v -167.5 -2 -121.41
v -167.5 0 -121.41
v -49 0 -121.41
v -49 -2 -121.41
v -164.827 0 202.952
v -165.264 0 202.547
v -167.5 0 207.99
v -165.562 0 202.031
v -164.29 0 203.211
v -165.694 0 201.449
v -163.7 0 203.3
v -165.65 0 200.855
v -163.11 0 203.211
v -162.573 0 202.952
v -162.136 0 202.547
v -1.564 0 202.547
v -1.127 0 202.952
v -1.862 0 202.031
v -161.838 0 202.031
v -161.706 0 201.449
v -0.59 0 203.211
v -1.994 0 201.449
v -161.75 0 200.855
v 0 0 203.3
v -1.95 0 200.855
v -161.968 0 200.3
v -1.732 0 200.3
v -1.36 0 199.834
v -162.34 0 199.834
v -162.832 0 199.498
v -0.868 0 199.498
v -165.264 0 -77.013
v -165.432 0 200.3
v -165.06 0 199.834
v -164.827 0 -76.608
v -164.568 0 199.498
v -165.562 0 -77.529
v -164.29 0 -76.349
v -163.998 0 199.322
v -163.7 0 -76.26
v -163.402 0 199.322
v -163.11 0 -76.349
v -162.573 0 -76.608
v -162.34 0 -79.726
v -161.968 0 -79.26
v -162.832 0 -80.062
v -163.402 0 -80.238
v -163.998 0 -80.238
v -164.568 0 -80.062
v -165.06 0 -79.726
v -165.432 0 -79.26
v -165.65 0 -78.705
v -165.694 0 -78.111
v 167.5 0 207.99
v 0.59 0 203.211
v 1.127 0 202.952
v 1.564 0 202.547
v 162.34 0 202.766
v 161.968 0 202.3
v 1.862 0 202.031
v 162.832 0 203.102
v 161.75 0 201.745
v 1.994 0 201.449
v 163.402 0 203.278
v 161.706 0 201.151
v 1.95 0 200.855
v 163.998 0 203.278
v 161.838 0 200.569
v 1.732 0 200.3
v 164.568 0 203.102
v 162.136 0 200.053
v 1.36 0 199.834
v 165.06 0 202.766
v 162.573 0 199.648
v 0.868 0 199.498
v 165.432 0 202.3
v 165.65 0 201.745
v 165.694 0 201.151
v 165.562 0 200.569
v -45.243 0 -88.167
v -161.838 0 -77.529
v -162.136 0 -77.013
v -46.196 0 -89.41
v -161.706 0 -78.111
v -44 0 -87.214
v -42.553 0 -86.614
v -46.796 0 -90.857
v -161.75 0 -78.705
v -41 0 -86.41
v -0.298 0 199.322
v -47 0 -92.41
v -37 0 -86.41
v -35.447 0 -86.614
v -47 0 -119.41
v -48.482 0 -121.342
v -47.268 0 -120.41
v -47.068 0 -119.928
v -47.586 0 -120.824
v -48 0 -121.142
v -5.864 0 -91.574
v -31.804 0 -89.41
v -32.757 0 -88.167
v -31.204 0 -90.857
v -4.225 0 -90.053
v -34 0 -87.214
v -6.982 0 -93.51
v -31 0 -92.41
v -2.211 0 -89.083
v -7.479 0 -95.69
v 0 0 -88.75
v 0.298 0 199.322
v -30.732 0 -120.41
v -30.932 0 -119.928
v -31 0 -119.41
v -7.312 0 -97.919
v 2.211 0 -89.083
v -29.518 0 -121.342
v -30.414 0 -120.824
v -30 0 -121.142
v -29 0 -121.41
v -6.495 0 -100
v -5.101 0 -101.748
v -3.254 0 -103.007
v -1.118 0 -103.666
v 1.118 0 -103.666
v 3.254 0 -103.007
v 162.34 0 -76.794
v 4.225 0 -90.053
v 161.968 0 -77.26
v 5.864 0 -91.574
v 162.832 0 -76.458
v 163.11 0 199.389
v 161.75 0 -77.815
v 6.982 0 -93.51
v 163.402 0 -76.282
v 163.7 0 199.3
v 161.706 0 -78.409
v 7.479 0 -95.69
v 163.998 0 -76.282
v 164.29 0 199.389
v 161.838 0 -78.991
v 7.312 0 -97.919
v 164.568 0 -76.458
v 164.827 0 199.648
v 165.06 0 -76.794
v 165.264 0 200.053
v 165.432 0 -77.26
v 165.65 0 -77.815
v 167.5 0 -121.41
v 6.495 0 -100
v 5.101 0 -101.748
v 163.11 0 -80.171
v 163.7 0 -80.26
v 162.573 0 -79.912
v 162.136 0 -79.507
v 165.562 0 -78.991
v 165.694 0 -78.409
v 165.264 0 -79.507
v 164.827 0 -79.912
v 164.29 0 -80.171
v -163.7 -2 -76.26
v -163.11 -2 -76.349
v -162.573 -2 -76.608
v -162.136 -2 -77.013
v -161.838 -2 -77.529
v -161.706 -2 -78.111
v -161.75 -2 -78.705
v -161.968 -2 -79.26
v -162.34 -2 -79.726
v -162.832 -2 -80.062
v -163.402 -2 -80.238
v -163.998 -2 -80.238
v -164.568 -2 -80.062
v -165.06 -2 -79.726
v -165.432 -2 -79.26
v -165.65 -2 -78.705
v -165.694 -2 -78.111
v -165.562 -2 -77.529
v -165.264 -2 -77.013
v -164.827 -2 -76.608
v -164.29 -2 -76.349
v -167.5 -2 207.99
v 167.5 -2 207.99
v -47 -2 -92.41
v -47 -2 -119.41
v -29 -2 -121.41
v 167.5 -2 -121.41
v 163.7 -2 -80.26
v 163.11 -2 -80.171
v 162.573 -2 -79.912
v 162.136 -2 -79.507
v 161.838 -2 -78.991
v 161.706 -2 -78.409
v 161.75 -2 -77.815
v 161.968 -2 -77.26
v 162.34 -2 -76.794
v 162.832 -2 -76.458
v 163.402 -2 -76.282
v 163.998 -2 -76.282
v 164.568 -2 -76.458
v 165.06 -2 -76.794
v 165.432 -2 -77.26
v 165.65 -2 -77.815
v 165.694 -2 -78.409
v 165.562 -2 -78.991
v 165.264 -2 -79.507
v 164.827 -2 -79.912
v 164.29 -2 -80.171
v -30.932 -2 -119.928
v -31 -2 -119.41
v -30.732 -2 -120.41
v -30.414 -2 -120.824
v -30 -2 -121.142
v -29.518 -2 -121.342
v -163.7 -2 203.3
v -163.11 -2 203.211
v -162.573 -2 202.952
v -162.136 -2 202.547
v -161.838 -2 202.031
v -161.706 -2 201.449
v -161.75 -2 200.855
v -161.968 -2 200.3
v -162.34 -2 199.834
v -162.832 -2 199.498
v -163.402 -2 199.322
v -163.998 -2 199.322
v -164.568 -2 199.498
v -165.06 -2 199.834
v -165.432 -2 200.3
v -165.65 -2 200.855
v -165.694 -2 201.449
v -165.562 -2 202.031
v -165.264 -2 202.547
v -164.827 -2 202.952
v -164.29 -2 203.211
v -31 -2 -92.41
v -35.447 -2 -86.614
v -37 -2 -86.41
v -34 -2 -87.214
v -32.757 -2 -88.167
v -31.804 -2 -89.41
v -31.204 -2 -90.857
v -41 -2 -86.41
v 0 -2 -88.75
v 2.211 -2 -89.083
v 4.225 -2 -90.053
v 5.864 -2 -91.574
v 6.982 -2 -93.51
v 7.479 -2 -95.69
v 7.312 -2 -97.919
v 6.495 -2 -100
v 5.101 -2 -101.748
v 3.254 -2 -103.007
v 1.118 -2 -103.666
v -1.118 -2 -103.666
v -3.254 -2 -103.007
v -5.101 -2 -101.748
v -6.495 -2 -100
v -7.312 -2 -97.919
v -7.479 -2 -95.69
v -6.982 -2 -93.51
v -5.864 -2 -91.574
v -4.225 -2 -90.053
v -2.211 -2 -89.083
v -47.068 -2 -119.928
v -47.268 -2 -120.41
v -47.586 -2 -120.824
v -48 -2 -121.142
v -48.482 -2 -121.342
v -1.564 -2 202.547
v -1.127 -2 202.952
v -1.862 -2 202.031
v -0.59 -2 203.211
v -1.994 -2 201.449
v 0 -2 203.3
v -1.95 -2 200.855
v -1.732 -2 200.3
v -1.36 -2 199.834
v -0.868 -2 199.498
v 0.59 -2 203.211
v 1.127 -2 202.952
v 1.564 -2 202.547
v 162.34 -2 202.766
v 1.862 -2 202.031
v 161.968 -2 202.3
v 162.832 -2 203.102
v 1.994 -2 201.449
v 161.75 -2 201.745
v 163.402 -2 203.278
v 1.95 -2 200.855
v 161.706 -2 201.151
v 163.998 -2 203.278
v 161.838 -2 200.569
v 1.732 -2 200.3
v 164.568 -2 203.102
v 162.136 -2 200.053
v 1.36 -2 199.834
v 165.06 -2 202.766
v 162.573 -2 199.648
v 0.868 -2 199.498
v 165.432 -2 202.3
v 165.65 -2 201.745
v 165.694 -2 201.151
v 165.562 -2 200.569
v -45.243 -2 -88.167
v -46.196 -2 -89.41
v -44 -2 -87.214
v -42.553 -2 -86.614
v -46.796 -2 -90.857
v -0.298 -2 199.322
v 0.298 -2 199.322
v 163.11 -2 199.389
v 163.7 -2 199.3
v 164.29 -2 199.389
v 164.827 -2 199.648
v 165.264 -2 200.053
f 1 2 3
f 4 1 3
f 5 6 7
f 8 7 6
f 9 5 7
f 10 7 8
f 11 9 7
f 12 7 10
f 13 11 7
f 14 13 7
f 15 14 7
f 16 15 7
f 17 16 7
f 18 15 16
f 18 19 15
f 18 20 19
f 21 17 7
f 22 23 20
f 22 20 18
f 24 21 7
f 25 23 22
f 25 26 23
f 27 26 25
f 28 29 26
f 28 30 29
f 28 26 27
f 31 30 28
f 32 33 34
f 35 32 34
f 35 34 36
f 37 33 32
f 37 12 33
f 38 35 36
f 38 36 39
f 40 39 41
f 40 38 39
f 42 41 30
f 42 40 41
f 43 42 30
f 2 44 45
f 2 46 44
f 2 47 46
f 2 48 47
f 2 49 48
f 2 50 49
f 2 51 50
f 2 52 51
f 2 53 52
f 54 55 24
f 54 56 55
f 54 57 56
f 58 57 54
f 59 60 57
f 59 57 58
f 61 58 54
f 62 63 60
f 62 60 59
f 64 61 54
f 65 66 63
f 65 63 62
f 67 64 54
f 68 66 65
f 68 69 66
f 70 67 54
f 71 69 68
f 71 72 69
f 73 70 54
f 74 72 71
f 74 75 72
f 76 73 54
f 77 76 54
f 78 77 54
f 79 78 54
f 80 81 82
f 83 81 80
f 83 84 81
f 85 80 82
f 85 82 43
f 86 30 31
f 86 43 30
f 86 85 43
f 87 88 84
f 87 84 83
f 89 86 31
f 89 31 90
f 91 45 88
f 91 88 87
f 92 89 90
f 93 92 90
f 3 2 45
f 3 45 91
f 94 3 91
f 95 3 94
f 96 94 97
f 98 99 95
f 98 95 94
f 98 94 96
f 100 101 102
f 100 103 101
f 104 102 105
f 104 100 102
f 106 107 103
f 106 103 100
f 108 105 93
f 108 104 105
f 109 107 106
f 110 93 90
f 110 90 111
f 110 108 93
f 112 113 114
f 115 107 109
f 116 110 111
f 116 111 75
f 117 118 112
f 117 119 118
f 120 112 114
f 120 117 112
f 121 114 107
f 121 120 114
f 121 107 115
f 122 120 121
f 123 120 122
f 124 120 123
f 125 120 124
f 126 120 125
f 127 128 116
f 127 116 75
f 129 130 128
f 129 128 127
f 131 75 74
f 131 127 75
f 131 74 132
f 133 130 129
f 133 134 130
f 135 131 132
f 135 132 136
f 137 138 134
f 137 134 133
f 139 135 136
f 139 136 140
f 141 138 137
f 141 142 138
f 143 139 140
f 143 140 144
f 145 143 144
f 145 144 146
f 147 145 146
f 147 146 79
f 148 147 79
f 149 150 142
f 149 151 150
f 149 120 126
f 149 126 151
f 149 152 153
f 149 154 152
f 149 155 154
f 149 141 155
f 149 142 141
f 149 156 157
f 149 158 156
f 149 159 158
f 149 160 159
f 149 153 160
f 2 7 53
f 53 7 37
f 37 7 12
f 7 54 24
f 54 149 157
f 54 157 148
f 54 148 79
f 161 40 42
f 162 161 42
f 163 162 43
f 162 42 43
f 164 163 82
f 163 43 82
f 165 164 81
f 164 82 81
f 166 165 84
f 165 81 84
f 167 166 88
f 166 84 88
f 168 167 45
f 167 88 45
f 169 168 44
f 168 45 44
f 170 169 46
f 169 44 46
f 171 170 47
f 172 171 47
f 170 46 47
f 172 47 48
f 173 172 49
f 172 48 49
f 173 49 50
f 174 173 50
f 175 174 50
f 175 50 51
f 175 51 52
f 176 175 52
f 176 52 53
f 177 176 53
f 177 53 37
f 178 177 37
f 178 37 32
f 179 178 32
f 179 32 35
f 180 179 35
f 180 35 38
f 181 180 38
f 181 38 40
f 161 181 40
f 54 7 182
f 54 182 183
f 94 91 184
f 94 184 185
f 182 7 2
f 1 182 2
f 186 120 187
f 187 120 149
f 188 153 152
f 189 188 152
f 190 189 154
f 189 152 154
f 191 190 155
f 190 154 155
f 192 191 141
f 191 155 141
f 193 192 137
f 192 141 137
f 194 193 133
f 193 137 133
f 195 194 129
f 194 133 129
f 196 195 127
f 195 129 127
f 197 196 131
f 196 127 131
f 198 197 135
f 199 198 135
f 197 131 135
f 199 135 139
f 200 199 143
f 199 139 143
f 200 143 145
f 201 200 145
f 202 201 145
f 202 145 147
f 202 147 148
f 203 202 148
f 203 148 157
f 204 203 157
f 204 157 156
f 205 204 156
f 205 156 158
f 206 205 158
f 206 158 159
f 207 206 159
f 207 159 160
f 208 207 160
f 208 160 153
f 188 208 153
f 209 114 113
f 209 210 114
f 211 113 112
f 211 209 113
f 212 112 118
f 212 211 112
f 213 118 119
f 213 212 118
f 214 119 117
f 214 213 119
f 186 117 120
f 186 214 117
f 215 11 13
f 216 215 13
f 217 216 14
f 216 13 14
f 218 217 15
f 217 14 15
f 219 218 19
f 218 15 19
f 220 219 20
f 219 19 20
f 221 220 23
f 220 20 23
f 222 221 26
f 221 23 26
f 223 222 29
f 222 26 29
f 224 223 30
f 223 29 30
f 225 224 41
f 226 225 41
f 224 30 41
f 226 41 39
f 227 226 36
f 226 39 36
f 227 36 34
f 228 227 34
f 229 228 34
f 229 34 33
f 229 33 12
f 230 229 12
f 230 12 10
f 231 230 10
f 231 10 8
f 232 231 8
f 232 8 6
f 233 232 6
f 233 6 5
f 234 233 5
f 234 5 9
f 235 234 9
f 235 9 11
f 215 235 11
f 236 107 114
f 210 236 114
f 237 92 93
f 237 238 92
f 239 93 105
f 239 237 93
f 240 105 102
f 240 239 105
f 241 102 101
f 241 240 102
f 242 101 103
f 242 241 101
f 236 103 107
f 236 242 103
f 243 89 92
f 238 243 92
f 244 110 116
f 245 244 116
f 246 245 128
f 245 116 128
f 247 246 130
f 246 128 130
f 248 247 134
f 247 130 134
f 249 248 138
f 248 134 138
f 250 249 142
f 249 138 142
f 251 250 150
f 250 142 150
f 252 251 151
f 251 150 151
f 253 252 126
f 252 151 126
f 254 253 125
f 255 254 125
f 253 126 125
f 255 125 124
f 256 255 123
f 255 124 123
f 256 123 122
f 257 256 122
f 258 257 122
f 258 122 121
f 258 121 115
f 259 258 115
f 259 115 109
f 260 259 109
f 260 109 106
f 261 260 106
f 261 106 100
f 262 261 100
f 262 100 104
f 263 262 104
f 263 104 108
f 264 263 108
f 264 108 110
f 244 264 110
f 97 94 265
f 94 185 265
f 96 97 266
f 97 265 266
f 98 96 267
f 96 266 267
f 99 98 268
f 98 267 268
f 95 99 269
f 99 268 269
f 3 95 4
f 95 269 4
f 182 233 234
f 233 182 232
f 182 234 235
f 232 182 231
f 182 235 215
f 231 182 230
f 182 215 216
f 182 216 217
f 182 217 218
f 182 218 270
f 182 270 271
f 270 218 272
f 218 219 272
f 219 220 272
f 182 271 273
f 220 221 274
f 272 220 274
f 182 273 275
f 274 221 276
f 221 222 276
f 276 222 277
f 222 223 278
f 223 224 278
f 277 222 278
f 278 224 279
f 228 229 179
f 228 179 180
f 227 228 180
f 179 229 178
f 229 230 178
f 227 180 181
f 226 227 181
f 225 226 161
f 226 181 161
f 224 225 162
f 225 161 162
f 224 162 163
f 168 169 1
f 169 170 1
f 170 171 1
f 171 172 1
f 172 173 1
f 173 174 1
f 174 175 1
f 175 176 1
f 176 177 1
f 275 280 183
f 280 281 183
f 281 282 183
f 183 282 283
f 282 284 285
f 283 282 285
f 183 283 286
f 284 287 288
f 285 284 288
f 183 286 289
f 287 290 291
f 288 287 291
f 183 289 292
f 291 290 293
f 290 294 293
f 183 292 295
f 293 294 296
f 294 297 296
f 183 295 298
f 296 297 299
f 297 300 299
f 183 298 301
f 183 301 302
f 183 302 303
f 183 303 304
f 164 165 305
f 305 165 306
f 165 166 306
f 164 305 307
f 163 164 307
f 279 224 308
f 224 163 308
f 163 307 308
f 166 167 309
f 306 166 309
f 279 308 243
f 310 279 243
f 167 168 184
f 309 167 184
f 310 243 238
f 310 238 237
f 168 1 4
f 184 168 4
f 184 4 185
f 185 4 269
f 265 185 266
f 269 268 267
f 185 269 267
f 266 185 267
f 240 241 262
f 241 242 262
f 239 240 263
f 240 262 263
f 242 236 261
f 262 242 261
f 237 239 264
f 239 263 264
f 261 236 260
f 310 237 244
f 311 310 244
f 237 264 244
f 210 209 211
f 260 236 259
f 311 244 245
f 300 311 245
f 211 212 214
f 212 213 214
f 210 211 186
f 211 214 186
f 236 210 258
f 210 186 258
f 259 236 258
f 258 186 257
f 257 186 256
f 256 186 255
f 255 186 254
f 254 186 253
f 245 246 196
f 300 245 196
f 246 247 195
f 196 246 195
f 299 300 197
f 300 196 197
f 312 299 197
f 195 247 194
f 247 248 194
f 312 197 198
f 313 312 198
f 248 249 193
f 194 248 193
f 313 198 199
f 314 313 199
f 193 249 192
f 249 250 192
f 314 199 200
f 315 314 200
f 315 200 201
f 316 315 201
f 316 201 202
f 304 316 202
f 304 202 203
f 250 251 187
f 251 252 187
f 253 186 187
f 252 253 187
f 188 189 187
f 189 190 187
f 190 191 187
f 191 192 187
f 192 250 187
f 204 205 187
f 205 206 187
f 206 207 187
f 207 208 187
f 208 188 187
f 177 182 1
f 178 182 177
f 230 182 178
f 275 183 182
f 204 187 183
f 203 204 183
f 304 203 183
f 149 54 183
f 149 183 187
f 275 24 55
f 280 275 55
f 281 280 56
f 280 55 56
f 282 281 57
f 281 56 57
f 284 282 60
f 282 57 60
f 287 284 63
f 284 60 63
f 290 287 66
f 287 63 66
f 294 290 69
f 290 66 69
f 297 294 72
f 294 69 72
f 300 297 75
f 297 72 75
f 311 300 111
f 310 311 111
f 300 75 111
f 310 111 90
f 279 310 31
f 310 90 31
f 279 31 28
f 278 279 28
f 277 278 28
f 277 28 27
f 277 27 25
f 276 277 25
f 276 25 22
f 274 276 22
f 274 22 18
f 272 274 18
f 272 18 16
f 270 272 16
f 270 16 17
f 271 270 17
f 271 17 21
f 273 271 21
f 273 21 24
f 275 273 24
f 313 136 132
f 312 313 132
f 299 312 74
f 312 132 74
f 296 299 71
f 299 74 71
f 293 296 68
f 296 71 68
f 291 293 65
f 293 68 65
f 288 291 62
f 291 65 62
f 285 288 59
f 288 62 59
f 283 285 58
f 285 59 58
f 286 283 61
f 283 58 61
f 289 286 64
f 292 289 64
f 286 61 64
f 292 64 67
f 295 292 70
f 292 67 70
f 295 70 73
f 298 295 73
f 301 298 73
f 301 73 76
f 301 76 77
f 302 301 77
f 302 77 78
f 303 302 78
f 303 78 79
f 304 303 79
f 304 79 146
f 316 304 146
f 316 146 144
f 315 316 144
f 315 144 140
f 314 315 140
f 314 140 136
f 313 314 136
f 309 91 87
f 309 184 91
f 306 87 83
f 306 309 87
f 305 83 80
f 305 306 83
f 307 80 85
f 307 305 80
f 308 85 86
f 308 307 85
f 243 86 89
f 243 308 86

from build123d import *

# Parameters (mm, degrees)
CROQUIS12_W           = 335
CROQUIS12_H           = 329.4
BRIDA_BASE2_DEPTH     = 2
CORTAR_EXTRUIR6_REACH = 269.058
CROQUIS27_R           = 2
CORTAR_EXTRUIR7_REACH = 269.058
CROQUIS28_R           = 7.5
CROQUIS29_W           = 16
CROQUIS29_H           = 35
CORTAR_EXTRUIR8_DEPTH = 268.058214815
REDONDEO1_R           = 6
REDONDEO2_R           = 2


# Sheet-metal steps are written as plain solids
with BuildPart() as part:
    # Croquis12 → Brida base2 (new body)
    with BuildSketch(Plane(origin=(0, 0, 0), x_dir=(1, 0, 0), z_dir=(0, 1, 0))):
        with Locations((0, -43.29)):
            Rectangle(CROQUIS12_W, CROQUIS12_H)
    extrude(amount=-BRIDA_BASE2_DEPTH)

    # Croquis27 → Cortar-Extruir6 (cut, up to next)
    with BuildSketch(Plane(origin=(0, 0, 0), x_dir=(1, 0, 0), z_dir=(0, 1, 0)), mode=Mode.PRIVATE) as cortar_extruir6_sk1:
        with Locations(Location((-163.7, -201.3, 0), (0, 0, 270))):
            Circle(CROQUIS27_R)
    cortar_extruir6_tool1 = extrude(cortar_extruir6_sk1.sketch, amount=-CORTAR_EXTRUIR6_REACH, mode=Mode.PRIVATE) & part.part
    # Croquis27 → Cortar-Extruir6 (cut, up to next)
    with BuildSketch(Plane(origin=(0, 0, 0), x_dir=(1, 0, 0), z_dir=(0, 1, 0)), mode=Mode.PRIVATE) as cortar_extruir6_sk2:
        with Locations(Location((-163.7, 78.26, 0), (0, 0, 270))):
            Circle(CROQUIS27_R)
    cortar_extruir6_tool2 = extrude(cortar_extruir6_sk2.sketch, amount=-CORTAR_EXTRUIR6_REACH, mode=Mode.PRIVATE) & part.part
    # Croquis27 → Cortar-Extruir6 (cut, up to next)
    with BuildSketch(Plane(origin=(0, 0, 0), x_dir=(1, 0, 0), z_dir=(0, 1, 0)), mode=Mode.PRIVATE) as cortar_extruir6_sk3:
        with Locations(Location((163.7, 78.26, 0), (0, 0, 90))):
            Circle(CROQUIS27_R)
    cortar_extruir6_tool3 = extrude(cortar_extruir6_sk3.sketch, amount=-CORTAR_EXTRUIR6_REACH, mode=Mode.PRIVATE) & part.part
    # Croquis27 → Cortar-Extruir6 (cut, up to next)
    with BuildSketch(Plane(origin=(0, 0, 0), x_dir=(1, 0, 0), z_dir=(0, 1, 0)), mode=Mode.PRIVATE) as cortar_extruir6_sk4:
        with Locations(Location((163.7, -201.3, 0), (0, 0, 90))):
            Circle(CROQUIS27_R)
    cortar_extruir6_tool4 = extrude(cortar_extruir6_sk4.sketch, amount=-CORTAR_EXTRUIR6_REACH, mode=Mode.PRIVATE) & part.part
    # Croquis27 → Cortar-Extruir6 (cut, up to next)
    with BuildSketch(Plane(origin=(0, 0, 0), x_dir=(1, 0, 0), z_dir=(0, 1, 0)), mode=Mode.PRIVATE) as cortar_extruir6_sk5:
        with Locations(Location((0, -201.3, 0), (0, 0, 270))):
            Circle(CROQUIS27_R)
    cortar_extruir6_tool5 = extrude(cortar_extruir6_sk5.sketch, amount=-CORTAR_EXTRUIR6_REACH, mode=Mode.PRIVATE) & part.part
    add(cortar_extruir6_tool1.solids().sort_by_distance((-163.7, 0, 201.3))[0], mode=Mode.SUBTRACT)
    add(cortar_extruir6_tool2.solids().sort_by_distance((-163.7, 0, -78.26))[0], mode=Mode.SUBTRACT)
    add(cortar_extruir6_tool3.solids().sort_by_distance((163.7, 0, -78.26))[0], mode=Mode.SUBTRACT)
    add(cortar_extruir6_tool4.solids().sort_by_distance((163.7, 0, 201.3))[0], mode=Mode.SUBTRACT)
    add(cortar_extruir6_tool5.solids().sort_by_distance((0, 0, 201.3))[0], mode=Mode.SUBTRACT)

    # Croquis28 → Cortar-Extruir7 (cut, up to next)
    with BuildSketch(Plane(origin=(0, 0, 0), x_dir=(1, 0, 0), z_dir=(0, 1, 0)), mode=Mode.PRIVATE) as cortar_extruir7_sk1:
        with Locations(Location((0, 96.25, 0), (0, 0, 270))):
            Circle(CROQUIS28_R)
    cortar_extruir7_tool1 = extrude(cortar_extruir7_sk1.sketch, amount=-CORTAR_EXTRUIR7_REACH, mode=Mode.PRIVATE) & part.part
    add(cortar_extruir7_tool1.solids().sort_by_distance((0, 0, -96.25))[0], mode=Mode.SUBTRACT)

    # Croquis29 → Cortar-Extruir8 (cut, through all)
    with BuildSketch(Plane(origin=(0, 0, 0), x_dir=(1, 0, 0), z_dir=(0, 1, 0))):
        with Locations((-39, 103.91)):
            Rectangle(CROQUIS29_W, CROQUIS29_H)
    extrude(amount=-CORTAR_EXTRUIR8_DEPTH, mode=Mode.SUBTRACT)

    # Redondeo1
    redondeo1_edges = [part.edges().sort_by_distance(p)[0] for p in [
        (-47, -1, -86.41),
        (-31, -1, -86.41),
    ]]
    fillet(redondeo1_edges, radius=REDONDEO1_R)

    # Redondeo2
    redondeo2_edges = [part.edges().sort_by_distance(p)[0] for p in [
        (-47, -1, -121.41),
        (-31, -1, -121.41),
    ]]
    fillet(redondeo2_edges, radius=REDONDEO2_R)


solid = part.part
